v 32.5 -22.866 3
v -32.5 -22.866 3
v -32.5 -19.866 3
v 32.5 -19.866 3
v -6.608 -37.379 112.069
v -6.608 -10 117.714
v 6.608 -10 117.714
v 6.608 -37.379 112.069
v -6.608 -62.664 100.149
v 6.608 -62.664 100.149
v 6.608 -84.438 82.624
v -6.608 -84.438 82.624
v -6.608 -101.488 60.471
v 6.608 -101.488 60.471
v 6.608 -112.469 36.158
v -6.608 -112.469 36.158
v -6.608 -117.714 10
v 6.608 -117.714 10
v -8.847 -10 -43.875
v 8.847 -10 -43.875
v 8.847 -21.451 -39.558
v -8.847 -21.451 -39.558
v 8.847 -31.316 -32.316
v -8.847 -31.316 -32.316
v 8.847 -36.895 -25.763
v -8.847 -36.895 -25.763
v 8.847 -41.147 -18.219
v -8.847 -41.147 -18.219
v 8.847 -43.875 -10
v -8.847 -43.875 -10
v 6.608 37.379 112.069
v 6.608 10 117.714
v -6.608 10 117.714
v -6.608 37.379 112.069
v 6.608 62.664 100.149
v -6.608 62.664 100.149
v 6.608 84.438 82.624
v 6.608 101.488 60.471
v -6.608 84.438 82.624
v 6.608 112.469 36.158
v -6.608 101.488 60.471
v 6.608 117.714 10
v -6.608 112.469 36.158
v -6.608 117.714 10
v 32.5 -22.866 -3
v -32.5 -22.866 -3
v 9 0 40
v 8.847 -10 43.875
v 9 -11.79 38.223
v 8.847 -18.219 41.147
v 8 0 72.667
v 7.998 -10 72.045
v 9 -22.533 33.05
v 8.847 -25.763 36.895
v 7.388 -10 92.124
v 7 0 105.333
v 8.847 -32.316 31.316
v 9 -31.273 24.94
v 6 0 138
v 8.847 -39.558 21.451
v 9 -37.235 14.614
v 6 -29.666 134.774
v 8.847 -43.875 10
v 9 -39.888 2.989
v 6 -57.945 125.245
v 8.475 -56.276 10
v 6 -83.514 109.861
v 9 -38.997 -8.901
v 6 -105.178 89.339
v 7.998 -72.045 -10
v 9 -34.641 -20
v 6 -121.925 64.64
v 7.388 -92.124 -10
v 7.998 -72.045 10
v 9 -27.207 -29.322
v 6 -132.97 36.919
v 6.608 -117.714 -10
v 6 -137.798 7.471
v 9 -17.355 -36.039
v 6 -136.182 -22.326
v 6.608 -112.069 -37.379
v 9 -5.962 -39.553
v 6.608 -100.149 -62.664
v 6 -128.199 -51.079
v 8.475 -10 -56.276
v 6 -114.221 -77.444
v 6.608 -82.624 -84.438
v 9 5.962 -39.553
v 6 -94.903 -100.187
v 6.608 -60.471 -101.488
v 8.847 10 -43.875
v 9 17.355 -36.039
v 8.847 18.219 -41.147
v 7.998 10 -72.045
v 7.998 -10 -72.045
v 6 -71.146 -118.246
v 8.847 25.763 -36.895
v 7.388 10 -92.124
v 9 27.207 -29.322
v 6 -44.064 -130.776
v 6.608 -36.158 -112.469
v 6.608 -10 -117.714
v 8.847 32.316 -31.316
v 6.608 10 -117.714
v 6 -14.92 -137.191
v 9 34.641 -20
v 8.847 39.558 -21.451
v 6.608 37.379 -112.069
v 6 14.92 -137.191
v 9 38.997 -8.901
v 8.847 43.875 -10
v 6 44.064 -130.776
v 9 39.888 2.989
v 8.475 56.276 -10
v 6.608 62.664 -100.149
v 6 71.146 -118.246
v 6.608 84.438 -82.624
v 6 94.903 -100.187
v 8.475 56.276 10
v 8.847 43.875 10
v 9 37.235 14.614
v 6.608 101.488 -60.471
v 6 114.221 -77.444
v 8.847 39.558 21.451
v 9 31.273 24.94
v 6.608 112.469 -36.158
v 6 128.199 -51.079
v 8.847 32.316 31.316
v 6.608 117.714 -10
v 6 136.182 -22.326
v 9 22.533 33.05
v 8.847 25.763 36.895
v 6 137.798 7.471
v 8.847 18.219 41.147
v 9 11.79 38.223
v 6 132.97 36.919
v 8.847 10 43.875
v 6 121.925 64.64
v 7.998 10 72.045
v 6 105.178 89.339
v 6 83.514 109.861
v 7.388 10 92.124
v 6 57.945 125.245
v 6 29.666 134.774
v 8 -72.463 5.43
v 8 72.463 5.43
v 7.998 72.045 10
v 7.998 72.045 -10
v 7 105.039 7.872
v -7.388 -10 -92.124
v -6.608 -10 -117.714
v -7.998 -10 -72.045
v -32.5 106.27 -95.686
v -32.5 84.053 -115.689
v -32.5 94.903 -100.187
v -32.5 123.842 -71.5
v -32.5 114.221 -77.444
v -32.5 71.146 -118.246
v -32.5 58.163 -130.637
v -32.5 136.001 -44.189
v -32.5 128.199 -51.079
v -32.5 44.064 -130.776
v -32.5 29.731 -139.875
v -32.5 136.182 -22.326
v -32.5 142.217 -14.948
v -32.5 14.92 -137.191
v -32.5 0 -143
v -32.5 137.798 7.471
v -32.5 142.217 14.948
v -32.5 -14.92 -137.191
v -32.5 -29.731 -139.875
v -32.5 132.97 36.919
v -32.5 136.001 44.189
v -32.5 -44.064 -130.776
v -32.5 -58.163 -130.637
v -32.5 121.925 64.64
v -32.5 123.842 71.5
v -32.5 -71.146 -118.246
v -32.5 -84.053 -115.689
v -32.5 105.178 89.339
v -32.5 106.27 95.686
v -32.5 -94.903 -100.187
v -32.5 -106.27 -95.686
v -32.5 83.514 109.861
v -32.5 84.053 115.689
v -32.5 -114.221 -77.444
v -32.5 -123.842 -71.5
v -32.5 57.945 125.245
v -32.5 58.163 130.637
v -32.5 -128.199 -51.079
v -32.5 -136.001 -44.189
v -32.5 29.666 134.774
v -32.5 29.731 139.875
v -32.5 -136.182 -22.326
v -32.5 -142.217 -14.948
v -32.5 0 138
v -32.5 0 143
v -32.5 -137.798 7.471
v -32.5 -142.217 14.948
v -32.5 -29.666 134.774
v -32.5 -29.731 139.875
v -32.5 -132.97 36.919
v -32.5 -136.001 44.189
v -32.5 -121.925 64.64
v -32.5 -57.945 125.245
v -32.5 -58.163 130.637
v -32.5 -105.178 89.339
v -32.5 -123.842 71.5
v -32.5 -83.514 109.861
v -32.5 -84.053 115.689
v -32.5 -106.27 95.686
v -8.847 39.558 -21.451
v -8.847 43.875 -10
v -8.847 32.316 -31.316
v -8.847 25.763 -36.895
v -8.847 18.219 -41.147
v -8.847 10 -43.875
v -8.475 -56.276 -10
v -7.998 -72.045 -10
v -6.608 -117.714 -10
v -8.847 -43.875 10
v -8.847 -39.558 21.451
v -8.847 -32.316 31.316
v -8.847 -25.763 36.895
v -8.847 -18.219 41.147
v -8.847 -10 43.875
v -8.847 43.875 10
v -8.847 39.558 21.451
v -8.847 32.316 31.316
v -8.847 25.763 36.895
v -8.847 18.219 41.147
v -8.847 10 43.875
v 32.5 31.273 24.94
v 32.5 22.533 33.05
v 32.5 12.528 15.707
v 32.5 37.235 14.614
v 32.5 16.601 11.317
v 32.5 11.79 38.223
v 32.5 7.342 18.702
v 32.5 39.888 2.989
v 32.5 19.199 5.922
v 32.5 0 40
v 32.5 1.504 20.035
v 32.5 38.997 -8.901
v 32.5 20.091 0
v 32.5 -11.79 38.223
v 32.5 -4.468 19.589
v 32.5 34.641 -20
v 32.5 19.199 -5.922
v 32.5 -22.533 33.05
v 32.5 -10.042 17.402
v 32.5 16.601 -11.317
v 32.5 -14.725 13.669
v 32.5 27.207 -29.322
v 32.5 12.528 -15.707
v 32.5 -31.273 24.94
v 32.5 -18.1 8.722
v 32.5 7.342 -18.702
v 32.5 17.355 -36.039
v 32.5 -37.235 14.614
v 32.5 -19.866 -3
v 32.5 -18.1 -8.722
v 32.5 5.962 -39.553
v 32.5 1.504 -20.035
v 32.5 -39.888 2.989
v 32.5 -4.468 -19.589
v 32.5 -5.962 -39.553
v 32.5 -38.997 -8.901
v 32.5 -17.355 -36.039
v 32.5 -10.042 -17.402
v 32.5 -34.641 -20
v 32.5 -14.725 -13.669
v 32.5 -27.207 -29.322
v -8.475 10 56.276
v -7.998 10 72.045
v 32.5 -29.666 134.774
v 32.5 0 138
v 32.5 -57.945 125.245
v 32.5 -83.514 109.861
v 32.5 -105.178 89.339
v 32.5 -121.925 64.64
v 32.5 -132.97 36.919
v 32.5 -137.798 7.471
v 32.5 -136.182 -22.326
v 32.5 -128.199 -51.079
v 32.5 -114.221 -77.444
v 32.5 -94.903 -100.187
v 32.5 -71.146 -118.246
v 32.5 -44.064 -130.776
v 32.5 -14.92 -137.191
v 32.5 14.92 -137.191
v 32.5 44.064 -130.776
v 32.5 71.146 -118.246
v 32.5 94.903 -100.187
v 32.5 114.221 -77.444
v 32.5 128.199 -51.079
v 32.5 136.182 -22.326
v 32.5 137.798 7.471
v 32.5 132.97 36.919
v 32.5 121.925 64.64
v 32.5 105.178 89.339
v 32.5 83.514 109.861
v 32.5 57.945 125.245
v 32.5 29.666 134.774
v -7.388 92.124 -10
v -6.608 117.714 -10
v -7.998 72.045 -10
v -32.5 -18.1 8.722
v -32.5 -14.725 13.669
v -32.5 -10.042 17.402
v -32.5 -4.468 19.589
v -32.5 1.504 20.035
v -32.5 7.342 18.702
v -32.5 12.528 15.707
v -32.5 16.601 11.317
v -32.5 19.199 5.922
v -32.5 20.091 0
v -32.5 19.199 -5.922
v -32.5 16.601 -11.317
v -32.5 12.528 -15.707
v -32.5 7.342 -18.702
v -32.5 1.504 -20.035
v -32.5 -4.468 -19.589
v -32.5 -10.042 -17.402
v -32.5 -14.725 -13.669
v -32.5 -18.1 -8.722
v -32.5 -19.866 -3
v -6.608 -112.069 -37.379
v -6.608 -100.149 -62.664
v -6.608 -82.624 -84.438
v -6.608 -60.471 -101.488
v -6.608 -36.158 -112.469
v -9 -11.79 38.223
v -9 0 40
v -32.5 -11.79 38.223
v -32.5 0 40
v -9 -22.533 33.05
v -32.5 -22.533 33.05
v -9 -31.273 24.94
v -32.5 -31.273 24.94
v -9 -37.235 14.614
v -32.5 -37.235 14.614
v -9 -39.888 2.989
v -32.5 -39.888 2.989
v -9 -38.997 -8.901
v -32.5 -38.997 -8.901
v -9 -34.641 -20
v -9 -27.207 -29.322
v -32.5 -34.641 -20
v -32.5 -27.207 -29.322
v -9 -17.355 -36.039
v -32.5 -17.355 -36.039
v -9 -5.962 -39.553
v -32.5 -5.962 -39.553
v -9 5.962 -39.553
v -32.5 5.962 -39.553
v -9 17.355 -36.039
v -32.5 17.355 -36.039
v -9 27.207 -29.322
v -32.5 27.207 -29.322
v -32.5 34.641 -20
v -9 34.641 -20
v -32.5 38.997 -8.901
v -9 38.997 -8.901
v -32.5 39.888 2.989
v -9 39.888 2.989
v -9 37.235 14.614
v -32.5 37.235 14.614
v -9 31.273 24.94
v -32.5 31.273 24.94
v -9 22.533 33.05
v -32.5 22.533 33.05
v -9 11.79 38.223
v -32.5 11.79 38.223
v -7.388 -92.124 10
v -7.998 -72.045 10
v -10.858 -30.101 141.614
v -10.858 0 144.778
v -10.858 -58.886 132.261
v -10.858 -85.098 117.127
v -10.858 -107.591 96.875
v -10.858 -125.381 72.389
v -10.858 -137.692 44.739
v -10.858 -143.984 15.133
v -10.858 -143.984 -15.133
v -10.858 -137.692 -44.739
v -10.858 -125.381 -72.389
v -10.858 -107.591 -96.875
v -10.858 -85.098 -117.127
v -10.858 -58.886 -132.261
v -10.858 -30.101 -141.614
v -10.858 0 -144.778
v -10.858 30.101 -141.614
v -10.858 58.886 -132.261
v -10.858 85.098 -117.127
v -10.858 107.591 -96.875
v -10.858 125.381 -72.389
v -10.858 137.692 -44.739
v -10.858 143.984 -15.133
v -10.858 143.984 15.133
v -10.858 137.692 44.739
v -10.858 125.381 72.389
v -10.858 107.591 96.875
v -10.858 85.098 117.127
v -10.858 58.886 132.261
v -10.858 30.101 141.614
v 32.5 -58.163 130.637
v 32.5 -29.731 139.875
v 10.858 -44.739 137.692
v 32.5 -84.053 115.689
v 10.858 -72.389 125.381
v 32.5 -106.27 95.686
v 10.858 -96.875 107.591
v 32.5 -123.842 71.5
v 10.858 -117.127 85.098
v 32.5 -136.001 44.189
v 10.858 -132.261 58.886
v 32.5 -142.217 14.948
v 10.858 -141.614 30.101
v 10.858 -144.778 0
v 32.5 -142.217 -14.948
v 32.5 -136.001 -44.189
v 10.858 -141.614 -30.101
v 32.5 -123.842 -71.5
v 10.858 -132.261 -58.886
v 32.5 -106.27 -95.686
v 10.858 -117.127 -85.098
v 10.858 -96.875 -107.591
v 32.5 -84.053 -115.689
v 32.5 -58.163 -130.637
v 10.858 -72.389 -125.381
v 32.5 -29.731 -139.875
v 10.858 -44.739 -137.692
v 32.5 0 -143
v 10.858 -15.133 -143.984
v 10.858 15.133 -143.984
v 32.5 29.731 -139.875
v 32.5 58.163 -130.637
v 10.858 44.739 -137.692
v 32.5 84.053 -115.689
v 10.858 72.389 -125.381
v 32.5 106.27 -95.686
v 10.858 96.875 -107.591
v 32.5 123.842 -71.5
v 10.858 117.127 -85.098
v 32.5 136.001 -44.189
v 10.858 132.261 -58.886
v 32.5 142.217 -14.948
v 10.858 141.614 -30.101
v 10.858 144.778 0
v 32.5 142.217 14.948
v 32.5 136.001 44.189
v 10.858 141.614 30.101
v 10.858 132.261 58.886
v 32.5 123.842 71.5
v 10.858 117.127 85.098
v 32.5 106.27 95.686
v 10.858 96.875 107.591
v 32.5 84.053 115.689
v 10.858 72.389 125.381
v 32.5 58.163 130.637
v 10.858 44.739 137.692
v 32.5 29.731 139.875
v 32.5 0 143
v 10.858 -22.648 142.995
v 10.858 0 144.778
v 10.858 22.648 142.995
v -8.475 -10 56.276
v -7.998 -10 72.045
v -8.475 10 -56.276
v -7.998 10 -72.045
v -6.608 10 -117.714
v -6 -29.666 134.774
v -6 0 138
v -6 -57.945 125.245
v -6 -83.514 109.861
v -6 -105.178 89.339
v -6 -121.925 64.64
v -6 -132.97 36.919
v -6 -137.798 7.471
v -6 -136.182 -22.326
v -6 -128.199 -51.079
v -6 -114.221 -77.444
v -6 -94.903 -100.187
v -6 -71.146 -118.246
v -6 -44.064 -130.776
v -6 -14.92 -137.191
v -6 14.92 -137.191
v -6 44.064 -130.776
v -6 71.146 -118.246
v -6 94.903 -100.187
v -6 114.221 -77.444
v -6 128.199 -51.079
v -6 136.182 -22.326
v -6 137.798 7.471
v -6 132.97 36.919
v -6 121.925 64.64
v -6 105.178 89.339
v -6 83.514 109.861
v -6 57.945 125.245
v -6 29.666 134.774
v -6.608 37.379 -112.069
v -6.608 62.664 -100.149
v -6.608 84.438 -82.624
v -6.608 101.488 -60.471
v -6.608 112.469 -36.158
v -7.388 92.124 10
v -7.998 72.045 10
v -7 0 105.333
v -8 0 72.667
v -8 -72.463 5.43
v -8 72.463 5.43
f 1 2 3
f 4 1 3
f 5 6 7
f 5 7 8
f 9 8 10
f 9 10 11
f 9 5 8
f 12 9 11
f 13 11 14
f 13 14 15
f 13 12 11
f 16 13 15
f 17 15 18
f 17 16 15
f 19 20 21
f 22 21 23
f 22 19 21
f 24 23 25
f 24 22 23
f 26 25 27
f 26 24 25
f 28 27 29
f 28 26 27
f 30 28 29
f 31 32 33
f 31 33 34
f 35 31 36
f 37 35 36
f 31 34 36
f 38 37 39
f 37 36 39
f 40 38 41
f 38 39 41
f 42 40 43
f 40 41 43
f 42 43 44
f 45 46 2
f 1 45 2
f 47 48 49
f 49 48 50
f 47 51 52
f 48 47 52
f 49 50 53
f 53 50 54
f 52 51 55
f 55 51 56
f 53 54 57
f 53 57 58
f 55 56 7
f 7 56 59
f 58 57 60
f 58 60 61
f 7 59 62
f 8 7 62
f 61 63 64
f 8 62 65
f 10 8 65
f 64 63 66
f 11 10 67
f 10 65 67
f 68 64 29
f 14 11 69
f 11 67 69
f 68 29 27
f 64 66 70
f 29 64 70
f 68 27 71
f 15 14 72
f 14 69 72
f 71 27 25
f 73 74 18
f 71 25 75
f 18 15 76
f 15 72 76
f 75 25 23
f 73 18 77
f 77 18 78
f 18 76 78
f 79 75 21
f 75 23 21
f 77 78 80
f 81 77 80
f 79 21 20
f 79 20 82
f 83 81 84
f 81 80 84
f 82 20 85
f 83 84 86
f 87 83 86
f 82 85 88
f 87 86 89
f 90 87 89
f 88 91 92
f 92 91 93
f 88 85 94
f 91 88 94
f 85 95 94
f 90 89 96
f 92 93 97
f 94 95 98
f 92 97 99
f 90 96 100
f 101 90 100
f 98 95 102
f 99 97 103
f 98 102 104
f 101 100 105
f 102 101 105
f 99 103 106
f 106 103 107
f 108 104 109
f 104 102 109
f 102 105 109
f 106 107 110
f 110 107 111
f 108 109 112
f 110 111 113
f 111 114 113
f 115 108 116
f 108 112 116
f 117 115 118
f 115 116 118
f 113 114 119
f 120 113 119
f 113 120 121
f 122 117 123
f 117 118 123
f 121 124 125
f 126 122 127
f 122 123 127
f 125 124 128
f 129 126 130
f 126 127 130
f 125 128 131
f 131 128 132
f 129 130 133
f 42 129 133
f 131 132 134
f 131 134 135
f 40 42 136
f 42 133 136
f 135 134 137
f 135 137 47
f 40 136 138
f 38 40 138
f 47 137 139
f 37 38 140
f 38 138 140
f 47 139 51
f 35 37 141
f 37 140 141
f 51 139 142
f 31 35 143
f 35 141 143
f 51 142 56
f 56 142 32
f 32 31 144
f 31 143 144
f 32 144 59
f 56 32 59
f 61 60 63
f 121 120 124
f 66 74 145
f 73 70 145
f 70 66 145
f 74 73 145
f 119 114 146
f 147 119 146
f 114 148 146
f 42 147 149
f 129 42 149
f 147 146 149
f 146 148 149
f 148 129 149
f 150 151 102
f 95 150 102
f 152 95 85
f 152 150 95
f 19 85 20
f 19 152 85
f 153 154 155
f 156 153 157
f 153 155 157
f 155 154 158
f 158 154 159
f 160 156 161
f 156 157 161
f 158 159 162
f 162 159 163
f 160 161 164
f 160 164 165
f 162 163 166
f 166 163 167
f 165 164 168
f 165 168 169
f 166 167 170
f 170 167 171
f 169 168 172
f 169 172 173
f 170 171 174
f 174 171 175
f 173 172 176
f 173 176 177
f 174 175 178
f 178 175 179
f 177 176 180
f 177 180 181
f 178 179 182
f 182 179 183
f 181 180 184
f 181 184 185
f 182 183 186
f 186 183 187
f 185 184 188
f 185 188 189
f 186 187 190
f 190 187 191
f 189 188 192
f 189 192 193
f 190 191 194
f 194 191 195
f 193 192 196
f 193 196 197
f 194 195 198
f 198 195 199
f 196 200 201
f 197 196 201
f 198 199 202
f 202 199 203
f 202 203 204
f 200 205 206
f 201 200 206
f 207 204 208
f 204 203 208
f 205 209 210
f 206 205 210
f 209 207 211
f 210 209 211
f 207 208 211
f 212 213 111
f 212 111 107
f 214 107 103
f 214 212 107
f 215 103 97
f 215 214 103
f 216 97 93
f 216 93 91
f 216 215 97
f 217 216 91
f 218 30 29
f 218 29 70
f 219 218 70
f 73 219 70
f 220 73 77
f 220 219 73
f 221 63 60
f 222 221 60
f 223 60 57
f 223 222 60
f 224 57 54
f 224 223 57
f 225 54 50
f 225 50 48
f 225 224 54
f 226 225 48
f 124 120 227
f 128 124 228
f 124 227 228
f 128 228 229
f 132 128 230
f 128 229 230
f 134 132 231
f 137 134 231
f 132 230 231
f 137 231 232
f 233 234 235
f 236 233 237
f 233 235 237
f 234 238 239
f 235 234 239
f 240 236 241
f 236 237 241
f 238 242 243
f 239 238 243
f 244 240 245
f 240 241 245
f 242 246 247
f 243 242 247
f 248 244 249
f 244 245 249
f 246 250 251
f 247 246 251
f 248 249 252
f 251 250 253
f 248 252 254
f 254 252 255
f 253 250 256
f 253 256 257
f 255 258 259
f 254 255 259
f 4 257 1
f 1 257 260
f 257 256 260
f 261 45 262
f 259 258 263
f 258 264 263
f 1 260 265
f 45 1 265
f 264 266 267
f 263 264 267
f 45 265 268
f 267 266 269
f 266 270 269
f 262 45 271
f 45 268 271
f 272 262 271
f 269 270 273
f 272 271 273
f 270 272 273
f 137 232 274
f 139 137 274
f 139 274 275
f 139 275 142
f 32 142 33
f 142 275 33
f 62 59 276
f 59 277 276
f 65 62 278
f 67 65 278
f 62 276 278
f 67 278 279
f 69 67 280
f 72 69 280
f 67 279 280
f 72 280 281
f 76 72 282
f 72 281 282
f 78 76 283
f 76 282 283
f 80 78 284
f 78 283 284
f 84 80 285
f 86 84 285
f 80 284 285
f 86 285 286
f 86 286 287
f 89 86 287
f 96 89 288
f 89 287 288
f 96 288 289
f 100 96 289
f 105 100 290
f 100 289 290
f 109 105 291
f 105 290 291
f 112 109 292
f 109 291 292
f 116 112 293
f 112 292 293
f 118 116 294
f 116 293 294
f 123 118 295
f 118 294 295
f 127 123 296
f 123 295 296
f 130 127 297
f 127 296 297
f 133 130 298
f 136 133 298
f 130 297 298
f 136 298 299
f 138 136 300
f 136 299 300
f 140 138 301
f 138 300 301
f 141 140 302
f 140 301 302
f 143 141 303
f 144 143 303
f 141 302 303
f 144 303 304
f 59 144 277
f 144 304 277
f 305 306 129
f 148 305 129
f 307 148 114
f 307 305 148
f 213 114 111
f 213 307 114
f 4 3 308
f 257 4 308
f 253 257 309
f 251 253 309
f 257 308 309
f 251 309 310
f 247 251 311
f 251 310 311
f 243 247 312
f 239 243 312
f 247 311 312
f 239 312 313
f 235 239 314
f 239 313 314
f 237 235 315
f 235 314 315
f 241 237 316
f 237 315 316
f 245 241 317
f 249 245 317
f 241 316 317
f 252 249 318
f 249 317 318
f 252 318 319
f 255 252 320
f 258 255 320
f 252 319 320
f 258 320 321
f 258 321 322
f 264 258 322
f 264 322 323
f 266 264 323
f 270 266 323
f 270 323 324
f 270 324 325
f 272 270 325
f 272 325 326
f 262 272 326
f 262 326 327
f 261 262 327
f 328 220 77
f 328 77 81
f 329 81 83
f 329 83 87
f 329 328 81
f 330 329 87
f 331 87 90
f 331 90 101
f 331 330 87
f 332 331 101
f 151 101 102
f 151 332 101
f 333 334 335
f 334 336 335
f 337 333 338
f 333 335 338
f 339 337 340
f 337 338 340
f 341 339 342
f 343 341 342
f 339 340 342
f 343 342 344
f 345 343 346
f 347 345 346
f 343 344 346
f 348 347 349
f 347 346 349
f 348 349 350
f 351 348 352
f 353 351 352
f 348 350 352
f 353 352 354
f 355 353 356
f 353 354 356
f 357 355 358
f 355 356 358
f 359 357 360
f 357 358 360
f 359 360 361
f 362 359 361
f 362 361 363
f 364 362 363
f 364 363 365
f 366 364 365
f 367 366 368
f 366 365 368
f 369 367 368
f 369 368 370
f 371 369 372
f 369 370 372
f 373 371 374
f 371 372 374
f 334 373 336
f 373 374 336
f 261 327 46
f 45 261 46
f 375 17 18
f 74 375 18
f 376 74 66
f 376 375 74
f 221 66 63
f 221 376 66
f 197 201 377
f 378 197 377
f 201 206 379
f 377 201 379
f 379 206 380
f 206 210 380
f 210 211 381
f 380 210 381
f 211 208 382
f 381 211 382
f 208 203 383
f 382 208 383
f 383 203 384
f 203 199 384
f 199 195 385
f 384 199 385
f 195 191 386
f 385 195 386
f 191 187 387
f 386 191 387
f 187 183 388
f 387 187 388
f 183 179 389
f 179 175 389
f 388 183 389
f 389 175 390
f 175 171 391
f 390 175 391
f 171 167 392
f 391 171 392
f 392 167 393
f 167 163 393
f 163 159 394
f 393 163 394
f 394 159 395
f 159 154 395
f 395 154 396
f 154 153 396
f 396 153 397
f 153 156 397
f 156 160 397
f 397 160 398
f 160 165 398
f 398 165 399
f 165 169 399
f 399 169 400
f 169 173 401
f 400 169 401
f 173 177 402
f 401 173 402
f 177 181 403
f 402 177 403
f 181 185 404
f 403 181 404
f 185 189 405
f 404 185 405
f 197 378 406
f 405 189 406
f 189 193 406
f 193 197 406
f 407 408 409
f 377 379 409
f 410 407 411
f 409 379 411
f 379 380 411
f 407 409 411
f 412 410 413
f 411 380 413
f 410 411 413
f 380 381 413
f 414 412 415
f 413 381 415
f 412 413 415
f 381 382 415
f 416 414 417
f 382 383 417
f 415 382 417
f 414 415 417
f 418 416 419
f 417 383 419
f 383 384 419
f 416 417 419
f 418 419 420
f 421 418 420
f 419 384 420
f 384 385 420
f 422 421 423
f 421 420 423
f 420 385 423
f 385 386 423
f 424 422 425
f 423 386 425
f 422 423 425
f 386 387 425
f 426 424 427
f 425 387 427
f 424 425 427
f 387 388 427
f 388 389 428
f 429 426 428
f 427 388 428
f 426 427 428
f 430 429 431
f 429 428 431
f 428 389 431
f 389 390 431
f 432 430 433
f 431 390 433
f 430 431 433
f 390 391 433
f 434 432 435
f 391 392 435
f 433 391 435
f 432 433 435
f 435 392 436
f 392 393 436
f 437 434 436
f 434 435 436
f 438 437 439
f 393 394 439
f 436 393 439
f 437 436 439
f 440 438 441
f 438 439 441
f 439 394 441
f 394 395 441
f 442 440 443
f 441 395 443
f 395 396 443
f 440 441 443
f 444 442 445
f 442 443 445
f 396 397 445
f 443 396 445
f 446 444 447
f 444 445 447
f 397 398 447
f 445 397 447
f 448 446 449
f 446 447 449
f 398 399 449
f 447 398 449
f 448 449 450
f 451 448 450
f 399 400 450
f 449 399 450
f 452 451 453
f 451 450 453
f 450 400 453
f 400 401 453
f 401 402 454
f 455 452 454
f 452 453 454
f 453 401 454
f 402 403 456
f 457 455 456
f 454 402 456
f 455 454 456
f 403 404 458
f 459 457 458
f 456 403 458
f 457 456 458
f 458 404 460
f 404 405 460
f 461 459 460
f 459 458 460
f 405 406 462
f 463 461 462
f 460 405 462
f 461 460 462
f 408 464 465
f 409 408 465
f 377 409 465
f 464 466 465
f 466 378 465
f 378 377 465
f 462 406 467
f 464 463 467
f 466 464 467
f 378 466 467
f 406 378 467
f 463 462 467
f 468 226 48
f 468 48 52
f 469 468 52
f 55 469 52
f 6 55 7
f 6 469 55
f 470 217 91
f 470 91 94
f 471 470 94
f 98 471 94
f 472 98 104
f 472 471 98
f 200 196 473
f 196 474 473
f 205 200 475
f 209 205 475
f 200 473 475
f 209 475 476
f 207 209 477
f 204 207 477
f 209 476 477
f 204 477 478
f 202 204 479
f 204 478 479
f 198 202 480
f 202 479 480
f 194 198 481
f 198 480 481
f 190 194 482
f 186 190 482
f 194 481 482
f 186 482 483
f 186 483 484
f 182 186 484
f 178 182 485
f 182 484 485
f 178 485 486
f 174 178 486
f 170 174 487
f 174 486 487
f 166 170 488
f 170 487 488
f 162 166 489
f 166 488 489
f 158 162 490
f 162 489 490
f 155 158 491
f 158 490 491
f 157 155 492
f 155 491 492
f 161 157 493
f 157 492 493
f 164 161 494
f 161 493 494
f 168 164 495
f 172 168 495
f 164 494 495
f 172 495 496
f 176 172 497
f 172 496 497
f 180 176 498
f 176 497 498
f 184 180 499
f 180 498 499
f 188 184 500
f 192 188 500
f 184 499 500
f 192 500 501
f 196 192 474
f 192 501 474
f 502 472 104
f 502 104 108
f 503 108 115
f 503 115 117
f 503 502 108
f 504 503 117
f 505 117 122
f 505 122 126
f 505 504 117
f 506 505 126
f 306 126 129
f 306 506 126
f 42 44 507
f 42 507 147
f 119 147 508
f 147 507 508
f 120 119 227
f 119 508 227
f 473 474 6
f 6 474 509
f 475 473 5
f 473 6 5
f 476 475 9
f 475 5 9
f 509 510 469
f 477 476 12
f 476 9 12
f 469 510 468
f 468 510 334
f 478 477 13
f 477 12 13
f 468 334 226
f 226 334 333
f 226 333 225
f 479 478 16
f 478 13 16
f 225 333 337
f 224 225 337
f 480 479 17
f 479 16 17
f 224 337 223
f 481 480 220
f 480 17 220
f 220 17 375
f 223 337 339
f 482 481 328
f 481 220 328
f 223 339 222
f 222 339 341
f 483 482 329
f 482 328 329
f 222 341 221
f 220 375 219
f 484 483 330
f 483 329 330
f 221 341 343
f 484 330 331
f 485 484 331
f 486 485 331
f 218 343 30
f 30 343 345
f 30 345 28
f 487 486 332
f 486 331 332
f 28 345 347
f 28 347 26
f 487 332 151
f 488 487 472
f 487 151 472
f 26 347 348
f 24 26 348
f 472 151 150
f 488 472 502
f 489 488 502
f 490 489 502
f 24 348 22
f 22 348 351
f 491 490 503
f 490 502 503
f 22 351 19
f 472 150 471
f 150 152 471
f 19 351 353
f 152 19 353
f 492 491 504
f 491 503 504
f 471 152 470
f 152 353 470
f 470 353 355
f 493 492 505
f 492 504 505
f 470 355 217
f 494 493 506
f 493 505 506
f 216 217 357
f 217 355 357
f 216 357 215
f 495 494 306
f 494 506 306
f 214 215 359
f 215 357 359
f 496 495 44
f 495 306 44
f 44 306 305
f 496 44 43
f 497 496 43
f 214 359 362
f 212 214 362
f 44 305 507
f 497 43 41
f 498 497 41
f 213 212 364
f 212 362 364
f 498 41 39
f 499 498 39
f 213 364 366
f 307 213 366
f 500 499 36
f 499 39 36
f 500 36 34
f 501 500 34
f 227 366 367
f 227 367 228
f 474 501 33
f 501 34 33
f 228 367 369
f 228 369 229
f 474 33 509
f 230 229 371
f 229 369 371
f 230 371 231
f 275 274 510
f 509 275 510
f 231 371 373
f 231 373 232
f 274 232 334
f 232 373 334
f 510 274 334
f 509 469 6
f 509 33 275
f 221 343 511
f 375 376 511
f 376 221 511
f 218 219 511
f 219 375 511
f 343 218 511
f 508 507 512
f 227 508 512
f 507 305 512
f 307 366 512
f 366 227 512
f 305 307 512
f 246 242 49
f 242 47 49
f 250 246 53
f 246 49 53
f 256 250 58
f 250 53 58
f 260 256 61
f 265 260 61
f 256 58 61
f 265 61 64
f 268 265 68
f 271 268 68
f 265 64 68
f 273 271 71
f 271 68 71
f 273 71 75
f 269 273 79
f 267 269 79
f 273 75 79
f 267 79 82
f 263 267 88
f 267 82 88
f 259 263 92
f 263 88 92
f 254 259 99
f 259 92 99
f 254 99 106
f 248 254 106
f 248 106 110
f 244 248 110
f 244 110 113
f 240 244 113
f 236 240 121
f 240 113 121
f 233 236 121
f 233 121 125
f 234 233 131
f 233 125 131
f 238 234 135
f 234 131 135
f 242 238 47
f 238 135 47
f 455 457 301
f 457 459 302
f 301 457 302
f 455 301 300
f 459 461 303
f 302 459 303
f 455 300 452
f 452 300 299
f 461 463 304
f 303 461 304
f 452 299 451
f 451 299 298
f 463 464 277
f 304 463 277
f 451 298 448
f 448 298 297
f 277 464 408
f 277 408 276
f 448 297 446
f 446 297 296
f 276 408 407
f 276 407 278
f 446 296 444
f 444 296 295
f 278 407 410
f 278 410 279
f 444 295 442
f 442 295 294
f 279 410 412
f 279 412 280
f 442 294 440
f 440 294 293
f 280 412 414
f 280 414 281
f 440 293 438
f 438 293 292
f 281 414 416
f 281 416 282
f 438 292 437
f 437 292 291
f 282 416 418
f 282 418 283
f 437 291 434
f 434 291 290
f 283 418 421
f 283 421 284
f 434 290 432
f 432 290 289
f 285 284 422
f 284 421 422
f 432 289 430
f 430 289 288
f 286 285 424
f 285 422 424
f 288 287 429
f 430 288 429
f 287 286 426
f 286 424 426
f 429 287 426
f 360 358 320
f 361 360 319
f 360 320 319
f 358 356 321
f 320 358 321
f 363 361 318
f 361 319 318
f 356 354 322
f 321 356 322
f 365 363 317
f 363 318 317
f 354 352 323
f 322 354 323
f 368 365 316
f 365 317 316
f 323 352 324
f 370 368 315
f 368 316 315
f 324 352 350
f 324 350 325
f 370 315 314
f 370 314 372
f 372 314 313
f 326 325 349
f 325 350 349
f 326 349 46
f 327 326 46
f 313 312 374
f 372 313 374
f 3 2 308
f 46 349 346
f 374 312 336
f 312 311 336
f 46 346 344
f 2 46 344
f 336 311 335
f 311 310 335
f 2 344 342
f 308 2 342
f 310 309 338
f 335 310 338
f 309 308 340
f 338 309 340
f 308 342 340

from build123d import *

# Parameters (mm, degrees)
CUT_EXTRUDE4_DEPTH      = 208.620447125
CUT_EXTRUDE4_DEPTH_BACK = 208.620447125
CUT_EXTRUDE5_DEPTH      = 216.116247808
CUT_EXTRUDE5_DEPTH_BACK = 216.116247808


with BuildPart() as part:
    # Sketch2 → Revolve2 (revolve)
    with BuildSketch(Plane.XY, mode=Mode.PRIVATE) as revolve2_sk:
        with BuildLine():
            Line((32.5, 20), (32.5, 40))
            Line((32.5, 40), (9, 40))
            Line((9, 40), (6, 138))
            Line((6, 138), (32.5, 138))
            Line((32.5, 138), (32.5, 143))
            ThreePointArc((32.5, 143), (0, 145), (-32.5, 143))
            Line((-32.5, 143), (-32.5, 138))
            Line((-32.5, 138), (-6, 138))
            Line((-6, 138), (-9, 40))
            Line((-9, 40), (-32.5, 40))
            Line((-32.5, 40), (-32.5, 20))
            Line((-32.5, 20), (32.5, 20))
        make_face()
    revolve(revolve2_sk.sketch.rotate(Axis((-129.939855751, 0, 0), (1, 0, 0)), 90), axis=Axis((-129.939855751, 0, 0), (1, 0, 0)))

    # Sketch3 → Cut-Extrude4 (cut, two sides: drawn at the far end of the back side and taken through both)
    with BuildSketch(Plane(origin=(0, 0, 0), x_dir=(0, 0, -1), z_dir=(1, 0, 0)).offset(-CUT_EXTRUDE4_DEPTH_BACK)):
        with BuildLine():
            Line((10, 117.714149843), (10, 43.874821937))
            ThreePointArc((10, 43.874821937), (31.819805153, 31.819805153), (43.874821937, 10))
            Line((43.874821937, 10), (117.714149843, 10))
            ThreePointArc((117.714149843, 10), (83.536282755, 83.536282755), (10, 117.714149843))
        make_face()
        with BuildLine():
            Line((-10, 117.714149843), (-10, 43.874821937))
            ThreePointArc((-10, 43.874821937), (-31.819805153, 31.819805153), (-43.874821937, 10))
            Line((-43.874821937, 10), (-117.714149843, 10))
            ThreePointArc((-117.714149843, 10), (-83.536282755, 83.536282755), (-10, 117.714149843))
        make_face()
        with BuildLine():
            Line((117.714149843, -10), (43.874821937, -10))
            ThreePointArc((43.874821937, -10), (31.819805153, -31.819805153), (10, -43.874821937))
            Line((10, -43.874821937), (10, -117.714149843))
            ThreePointArc((10, -117.714149843), (83.536282755, -83.536282755), (117.714149843, -10))
        make_face()
        with BuildLine():
            Line((-10, -117.714149843), (-10, -43.874821937))
            ThreePointArc((-10, -43.874821937), (-31.819805153, -31.819805153), (-43.874821937, -10))
            Line((-43.874821937, -10), (-117.714149843, -10))
            ThreePointArc((-117.714149843, -10), (-83.536282755, -83.536282755), (-10, -117.714149843))
        make_face()
    extrude(amount=CUT_EXTRUDE4_DEPTH + CUT_EXTRUDE4_DEPTH_BACK, mode=Mode.SUBTRACT)

    # Sketch4 → Cut-Extrude5 (cut, two sides: drawn at the far end of the back side and taken through both)
    with BuildSketch(Plane(origin=(32.5, 0, 0), x_dir=(0, 0, -1), z_dir=(1, 0, 0)).offset(-CUT_EXTRUDE5_DEPTH_BACK)):
        with BuildLine():
            Line((3, -19.866261329), (3, -22.866261329))
            Line((3, -22.866261329), (-3, -22.866261329))
            Line((-3, -22.866261329), (-3, -19.866261329))
            ThreePointArc((-3, -19.866261329), (0, 20.091499177), (3, -19.866261329))
        make_face()
    extrude(amount=CUT_EXTRUDE5_DEPTH + CUT_EXTRUDE5_DEPTH_BACK, mode=Mode.SUBTRACT)


solid = part.part
